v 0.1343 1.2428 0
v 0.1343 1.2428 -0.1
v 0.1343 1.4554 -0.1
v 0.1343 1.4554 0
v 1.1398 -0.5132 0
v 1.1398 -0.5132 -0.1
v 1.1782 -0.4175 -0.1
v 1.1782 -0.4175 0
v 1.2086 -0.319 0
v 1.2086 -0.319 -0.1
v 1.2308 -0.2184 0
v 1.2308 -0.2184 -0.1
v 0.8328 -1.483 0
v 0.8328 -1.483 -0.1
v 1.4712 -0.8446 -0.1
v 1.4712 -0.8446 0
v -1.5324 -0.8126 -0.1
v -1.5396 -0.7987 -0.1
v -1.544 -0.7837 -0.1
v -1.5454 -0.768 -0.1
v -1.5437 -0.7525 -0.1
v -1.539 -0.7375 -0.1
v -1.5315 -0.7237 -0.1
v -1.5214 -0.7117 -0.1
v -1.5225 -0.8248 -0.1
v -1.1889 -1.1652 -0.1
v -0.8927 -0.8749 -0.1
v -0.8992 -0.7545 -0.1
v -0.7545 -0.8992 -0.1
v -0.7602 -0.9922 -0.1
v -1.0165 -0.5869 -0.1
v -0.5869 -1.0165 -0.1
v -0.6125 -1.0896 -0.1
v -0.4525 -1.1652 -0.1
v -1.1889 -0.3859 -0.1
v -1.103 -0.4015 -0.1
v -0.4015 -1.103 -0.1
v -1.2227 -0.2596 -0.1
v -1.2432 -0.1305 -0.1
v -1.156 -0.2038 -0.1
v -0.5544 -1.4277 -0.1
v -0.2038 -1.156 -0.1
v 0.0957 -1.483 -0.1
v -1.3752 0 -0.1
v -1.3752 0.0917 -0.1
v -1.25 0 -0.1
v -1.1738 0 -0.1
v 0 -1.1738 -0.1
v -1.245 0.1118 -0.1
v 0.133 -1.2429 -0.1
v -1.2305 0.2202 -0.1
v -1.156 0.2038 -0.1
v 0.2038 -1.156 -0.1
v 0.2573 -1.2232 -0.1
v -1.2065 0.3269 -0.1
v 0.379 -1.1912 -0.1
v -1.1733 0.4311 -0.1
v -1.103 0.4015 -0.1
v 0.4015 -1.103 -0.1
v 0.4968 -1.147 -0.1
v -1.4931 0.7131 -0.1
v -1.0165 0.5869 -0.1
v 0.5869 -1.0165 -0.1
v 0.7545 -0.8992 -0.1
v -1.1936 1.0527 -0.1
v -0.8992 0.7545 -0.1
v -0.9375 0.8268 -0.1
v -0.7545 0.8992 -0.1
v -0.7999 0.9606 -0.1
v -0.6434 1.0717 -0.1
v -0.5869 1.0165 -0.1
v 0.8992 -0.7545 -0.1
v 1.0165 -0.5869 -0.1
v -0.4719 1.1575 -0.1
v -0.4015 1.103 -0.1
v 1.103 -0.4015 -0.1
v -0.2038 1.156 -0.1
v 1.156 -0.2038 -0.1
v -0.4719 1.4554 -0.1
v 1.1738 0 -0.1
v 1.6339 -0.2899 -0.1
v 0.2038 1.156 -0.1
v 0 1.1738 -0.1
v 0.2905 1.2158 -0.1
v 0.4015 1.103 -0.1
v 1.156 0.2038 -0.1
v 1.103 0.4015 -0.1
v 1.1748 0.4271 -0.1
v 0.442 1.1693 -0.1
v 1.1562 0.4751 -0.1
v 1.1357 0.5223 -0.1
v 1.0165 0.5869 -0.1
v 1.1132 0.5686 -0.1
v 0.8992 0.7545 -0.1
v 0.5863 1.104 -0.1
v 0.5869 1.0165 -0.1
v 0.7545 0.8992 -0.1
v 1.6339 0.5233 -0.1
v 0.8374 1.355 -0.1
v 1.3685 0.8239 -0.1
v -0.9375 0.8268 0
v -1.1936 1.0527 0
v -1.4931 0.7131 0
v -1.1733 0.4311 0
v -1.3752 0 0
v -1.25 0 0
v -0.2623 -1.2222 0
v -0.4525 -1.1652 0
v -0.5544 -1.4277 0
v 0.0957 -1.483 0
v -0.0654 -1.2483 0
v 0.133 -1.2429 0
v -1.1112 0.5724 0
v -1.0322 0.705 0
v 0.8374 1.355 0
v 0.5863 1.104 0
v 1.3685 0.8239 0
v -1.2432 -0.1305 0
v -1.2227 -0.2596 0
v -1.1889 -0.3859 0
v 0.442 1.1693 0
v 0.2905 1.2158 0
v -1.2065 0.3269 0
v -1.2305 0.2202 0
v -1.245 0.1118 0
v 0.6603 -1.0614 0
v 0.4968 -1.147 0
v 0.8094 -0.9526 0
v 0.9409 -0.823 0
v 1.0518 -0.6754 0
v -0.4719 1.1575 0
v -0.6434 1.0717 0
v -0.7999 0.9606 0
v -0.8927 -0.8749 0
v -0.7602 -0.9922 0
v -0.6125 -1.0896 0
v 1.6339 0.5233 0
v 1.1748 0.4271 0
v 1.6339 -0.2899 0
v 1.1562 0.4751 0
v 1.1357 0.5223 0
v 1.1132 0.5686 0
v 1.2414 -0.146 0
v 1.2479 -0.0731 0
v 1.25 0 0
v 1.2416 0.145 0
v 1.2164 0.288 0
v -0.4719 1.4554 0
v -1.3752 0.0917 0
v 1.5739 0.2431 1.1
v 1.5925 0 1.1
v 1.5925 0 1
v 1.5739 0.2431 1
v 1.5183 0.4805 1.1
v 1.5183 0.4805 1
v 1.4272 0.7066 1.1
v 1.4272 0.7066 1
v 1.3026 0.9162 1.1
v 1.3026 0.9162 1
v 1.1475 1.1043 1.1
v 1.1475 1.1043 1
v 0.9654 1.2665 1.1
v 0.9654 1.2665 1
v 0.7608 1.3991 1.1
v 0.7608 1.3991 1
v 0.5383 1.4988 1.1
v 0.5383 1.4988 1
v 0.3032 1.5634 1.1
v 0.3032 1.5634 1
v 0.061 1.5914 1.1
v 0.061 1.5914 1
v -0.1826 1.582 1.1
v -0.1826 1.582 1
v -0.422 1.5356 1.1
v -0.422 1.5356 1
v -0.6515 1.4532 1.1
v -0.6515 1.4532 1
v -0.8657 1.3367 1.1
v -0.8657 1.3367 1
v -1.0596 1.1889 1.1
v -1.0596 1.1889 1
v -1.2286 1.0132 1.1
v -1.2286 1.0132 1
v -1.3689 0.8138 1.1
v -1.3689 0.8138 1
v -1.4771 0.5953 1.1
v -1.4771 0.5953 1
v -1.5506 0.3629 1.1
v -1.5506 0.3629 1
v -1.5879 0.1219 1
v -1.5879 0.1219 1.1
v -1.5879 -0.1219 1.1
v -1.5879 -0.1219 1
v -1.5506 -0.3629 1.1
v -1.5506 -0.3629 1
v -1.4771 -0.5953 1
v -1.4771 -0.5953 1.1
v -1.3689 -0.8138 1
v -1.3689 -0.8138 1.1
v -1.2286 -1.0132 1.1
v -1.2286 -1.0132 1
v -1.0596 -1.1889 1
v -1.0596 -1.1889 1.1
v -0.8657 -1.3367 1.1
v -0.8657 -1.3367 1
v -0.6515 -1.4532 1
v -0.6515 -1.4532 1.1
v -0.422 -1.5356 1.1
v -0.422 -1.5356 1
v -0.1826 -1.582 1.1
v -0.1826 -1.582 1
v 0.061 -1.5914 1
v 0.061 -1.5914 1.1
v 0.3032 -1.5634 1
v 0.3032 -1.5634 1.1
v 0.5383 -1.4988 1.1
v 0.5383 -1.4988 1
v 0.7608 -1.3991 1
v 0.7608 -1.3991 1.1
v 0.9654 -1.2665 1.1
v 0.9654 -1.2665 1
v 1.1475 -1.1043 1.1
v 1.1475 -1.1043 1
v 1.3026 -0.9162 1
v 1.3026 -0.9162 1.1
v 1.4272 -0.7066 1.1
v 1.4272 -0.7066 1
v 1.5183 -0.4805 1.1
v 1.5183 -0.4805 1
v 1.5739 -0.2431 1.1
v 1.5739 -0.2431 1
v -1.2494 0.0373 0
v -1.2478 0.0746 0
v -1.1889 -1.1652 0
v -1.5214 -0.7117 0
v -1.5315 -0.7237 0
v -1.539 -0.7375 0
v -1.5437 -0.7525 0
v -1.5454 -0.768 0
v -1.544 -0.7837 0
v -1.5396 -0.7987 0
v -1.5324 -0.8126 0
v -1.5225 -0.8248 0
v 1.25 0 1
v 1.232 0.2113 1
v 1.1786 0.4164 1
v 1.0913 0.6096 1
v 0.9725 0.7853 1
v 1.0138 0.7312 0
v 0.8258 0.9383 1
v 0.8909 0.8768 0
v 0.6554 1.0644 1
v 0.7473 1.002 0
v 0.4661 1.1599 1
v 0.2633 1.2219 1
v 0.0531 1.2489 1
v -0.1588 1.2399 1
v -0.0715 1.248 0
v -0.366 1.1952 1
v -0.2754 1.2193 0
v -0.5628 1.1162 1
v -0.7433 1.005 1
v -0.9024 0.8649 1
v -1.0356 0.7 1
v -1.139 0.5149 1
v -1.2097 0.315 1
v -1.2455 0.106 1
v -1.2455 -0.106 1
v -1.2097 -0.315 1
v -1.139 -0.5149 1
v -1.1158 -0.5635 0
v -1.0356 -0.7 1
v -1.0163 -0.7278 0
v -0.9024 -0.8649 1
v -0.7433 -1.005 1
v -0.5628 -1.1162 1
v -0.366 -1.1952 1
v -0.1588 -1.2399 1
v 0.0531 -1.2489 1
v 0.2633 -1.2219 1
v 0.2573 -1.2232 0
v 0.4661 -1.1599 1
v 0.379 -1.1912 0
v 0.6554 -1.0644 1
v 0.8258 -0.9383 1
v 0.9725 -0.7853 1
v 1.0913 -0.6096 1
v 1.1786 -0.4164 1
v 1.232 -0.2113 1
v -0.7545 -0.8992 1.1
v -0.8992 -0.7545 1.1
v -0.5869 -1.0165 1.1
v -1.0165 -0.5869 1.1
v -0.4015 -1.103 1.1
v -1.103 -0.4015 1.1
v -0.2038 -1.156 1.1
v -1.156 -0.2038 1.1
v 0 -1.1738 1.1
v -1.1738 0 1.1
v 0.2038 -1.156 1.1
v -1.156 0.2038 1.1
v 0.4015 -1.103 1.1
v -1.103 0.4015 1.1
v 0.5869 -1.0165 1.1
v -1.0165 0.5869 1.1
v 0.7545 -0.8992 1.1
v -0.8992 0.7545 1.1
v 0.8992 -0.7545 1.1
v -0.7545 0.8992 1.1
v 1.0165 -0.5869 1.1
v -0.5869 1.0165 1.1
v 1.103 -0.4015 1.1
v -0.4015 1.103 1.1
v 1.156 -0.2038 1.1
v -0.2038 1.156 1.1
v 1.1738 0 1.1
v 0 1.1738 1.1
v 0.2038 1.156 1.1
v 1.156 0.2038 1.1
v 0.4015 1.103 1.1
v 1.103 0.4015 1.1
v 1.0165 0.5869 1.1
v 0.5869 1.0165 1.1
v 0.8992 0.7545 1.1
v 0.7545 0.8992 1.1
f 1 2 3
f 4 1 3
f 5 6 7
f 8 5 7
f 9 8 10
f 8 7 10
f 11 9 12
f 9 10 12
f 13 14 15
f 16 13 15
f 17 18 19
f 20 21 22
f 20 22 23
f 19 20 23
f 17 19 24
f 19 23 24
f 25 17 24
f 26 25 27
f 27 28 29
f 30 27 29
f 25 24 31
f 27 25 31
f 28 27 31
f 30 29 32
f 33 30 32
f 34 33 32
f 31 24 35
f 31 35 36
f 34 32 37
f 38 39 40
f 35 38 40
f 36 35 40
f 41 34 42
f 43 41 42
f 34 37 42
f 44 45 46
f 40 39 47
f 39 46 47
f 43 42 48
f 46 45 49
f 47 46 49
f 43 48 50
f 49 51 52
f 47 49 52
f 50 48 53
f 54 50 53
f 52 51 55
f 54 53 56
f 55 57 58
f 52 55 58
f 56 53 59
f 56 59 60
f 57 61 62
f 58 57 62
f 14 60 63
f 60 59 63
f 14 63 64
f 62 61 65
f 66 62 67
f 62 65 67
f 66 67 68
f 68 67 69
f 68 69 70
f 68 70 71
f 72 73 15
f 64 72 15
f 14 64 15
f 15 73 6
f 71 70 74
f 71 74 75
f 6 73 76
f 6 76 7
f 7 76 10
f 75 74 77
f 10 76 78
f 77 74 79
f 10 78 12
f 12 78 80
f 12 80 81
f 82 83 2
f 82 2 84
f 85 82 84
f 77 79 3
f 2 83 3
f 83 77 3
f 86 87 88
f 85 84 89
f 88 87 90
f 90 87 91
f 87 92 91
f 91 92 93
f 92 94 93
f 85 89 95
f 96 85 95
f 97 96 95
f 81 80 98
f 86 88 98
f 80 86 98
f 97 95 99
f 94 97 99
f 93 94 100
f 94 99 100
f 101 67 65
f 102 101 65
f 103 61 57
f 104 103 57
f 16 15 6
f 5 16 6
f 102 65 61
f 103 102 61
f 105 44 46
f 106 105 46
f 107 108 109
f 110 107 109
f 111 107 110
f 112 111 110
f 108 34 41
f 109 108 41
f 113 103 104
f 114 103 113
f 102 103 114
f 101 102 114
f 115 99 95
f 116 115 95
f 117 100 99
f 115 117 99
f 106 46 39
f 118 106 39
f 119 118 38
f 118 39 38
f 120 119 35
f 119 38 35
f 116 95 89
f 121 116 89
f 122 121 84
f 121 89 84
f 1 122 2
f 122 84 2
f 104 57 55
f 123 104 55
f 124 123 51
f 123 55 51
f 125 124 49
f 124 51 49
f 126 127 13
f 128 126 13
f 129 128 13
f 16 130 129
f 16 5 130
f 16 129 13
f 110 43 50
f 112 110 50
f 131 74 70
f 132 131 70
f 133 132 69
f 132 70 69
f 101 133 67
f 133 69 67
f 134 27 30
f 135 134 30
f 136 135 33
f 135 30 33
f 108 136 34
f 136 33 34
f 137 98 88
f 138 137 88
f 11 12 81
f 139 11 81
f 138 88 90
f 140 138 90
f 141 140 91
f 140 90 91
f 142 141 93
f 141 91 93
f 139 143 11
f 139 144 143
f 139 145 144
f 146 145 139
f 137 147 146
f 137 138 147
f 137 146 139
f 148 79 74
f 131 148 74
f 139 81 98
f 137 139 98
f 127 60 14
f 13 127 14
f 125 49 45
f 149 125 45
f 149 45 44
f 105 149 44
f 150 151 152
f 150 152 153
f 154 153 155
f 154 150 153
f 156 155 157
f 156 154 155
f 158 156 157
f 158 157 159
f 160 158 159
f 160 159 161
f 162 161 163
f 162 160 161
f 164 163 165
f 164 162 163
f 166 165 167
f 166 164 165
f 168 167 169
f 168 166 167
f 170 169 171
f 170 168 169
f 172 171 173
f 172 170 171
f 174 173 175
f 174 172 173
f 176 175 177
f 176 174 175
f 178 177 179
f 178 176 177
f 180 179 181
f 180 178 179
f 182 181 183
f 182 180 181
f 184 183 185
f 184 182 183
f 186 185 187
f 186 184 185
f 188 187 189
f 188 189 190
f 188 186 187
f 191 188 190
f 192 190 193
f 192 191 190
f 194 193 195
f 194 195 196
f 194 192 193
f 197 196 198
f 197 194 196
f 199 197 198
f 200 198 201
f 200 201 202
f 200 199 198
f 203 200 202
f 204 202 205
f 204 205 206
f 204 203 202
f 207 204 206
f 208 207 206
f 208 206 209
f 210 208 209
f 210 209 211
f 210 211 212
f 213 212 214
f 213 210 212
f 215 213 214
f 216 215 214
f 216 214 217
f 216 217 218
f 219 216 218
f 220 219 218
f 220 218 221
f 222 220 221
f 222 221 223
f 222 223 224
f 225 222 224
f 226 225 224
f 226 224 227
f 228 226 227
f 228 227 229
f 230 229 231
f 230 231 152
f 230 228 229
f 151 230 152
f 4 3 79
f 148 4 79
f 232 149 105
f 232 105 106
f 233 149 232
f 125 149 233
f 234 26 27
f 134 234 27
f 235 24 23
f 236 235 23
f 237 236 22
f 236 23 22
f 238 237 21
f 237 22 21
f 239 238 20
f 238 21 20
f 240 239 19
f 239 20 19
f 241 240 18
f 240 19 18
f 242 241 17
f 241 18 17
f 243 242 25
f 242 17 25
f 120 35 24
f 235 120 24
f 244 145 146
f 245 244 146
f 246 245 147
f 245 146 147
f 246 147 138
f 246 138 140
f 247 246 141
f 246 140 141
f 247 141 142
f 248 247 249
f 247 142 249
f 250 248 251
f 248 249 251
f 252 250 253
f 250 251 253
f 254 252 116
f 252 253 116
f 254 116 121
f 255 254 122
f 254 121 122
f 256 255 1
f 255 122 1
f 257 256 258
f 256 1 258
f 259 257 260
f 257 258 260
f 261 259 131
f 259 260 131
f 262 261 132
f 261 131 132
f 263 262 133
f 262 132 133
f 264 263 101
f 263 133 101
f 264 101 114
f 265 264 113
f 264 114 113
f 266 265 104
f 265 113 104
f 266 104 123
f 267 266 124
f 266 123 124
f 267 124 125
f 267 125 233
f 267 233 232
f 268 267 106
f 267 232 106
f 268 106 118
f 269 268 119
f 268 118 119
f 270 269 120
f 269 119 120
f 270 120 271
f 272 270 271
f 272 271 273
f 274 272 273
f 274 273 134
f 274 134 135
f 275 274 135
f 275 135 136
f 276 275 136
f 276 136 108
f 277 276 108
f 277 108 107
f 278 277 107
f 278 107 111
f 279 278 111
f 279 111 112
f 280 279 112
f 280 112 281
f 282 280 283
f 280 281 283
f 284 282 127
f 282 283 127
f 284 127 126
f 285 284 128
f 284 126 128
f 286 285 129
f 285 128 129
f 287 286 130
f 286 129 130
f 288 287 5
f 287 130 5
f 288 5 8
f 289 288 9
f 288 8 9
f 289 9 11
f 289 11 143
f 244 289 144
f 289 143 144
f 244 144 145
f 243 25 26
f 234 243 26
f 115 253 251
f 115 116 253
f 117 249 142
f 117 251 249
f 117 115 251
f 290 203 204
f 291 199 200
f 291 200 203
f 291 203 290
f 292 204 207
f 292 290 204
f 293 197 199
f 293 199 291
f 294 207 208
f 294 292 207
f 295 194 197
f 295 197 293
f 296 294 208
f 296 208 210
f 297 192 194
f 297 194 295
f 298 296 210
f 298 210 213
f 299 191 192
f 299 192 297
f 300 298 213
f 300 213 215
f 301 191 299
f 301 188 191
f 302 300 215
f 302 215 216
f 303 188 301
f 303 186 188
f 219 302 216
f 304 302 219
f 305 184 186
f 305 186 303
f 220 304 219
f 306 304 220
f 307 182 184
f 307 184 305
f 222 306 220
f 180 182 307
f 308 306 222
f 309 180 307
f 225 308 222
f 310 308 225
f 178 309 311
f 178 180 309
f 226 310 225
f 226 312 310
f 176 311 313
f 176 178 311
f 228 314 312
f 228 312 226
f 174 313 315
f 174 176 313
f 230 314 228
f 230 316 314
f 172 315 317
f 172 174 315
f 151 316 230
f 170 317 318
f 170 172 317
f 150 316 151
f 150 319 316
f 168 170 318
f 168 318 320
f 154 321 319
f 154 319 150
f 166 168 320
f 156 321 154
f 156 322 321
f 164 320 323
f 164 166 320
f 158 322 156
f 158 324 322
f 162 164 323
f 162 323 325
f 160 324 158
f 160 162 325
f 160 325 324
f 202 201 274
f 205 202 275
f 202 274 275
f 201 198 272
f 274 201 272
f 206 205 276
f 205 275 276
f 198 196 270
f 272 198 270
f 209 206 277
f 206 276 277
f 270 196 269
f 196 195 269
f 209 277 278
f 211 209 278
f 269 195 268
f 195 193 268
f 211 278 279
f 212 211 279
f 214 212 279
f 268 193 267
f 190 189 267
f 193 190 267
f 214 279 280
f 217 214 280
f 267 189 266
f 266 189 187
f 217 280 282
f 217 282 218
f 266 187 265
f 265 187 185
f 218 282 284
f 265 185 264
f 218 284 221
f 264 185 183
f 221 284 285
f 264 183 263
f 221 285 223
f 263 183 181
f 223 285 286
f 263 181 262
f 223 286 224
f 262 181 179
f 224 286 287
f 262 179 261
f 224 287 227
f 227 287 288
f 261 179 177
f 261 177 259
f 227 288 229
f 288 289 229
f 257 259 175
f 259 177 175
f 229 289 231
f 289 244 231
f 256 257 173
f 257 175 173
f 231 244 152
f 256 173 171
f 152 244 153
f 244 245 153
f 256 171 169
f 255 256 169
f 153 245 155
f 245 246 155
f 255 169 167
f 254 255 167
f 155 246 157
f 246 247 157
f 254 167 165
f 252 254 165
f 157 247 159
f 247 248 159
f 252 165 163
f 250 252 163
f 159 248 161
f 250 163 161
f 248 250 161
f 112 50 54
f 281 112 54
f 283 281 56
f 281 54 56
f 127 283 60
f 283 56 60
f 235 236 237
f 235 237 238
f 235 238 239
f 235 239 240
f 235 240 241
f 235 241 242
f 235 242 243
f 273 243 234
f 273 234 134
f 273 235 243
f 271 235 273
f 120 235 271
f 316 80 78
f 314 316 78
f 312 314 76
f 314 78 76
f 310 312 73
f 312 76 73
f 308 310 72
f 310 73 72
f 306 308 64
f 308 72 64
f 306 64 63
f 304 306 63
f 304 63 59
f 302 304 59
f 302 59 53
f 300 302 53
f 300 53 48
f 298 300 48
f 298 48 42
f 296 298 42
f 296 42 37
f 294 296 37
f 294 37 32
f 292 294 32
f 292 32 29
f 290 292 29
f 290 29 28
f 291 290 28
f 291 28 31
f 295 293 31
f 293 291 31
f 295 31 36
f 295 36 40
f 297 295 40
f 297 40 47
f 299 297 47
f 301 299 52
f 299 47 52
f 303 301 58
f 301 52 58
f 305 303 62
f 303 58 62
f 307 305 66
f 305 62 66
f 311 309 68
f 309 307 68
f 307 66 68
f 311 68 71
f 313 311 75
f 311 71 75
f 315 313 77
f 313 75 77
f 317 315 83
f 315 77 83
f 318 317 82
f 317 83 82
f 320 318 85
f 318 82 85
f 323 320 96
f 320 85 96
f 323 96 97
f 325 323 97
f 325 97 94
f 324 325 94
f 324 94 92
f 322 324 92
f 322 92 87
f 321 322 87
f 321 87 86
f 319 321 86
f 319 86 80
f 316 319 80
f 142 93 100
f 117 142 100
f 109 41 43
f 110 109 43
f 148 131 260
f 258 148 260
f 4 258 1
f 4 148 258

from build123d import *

# Parameters (mm, degrees)
SKICA1_R                 = 1.25
P_IDAT_VYSUNUT_M1_DEPTH  = 1
SKICA2_R                 = 1.173786911
ODEBRAT_VYSUNUT_M1_DEPTH = 10
P_IDAT_START             = 0.1
SKICA3_R                 = 1.592540519
SKICA3_R_2               = 1.173786911
P_IDAT_VYSUNUT_M2_DEPTH  = 0.1
SKICA4_R                 = 1.173786911
P_IDAT_VYSUNUT_M3_DEPTH  = 0.1


with BuildPart() as part:
    # Skica1 → Přidat vysunutím1 (new body)
    with BuildSketch(Plane.XY):
        Circle(SKICA1_R)
    extrude(amount=P_IDAT_VYSUNUT_M1_DEPTH)

    # Skica2 → Odebrat vysunutím1 (cut)
    with BuildSketch(Plane.XY.offset(1)):
        Circle(SKICA2_R)
    extrude(amount=-ODEBRAT_VYSUNUT_M1_DEPTH, mode=Mode.SUBTRACT)

    # Skica3 → Přidat vysunutím2 (add)
    with BuildSketch(Plane.XY.offset(1).offset(P_IDAT_START)):
        Circle(SKICA3_R)
        Circle(SKICA3_R_2, mode=Mode.SUBTRACT)
    extrude(amount=-P_IDAT_VYSUNUT_M2_DEPTH)

    # Skica4 → Přidat vysunutím3 (add)
    with BuildSketch(Plane(origin=(0, 0, 0), x_dir=(-1, 0, 0), z_dir=(0, 0, -1)).offset(P_IDAT_START)):
        with BuildLine():
            Line((-0.134315846, 1.24276275), (-0.134315846, 1.455404156))
            Line((-0.134315846, 1.455404156), (0.471854701, 1.455404156))
            Line((0.471854701, 1.455404156), (0.471854701, 1.157520255))
            ThreePointArc((0.471854701, 1.157520255), (0.723799345, 1.019124383), (0.937467385, 0.826834266))
            Line((0.937467385, 0.826834266), (1.193570715, 1.052714134))
            Line((1.193570715, 1.052714134), (1.493085883, 0.71312286))
            Line((1.493085883, 0.71312286), (1.173313122, 0.431087367))
            ThreePointArc((1.173313122, 0.431087367), (1.219641203, 0.273816243), (1.244987165, 0.111834515))
            Line((1.244987165, 0.111834515), (1.375237606, 0.091671596))
            Line((1.375237606, 0.091671596), (1.375237606, 0))
            Line((1.375237606, 0), (1.25, 0))
            ThreePointArc((1.25, 0), (1.234641469, -0.19534698), (1.188943292, -0.385893572))
            Line((1.188943292, -0.385893572), (1.521394679, -0.71171305))
            ThreePointArc((1.521394679, -0.71171305), (1.545394832, -0.768042668), (1.522534448, -0.824844394))
            Line((1.522534448, -0.824844394), (1.188943292, -1.165225648))
            Line((1.188943292, -1.165225648), (0.892743068, -0.874934177))
            ThreePointArc((0.892743068, -0.874934177), (0.688100113, -1.043560365), (0.452492198, -1.165225648))
            Line((0.452492198, -1.165225648), (0.554420085, -1.427703077))
            Line((0.554420085, -1.427703077), (-0.095705572, -1.483046114))
            Line((-0.095705572, -1.483046114), (-0.13304786, -1.242899138))
            ThreePointArc((-0.13304786, -1.242899138), (-0.31854859, -1.208729414), (-0.496795977, -1.147036947))
            Line((-0.496795977, -1.147036947), (-0.832805143, -1.483046114))
            Line((-0.832805143, -1.483046114), (-1.471238112, -0.844613145))
            Line((-1.471238112, -0.844613145), (-1.139802222, -0.513177255))
            ThreePointArc((-1.139802222, -0.513177255), (-1.194422371, -0.368585403), (-1.230780155, -0.218357988))
            Line((-1.230780155, -0.218357988), (-1.633865576, -0.289871103))
            Line((-1.633865576, -0.289871103), (-1.633865576, 0.523252679))
            Line((-1.633865576, 0.523252679), (-1.174778121, 0.427078876))
            ThreePointArc((-1.174778121, 0.427078876), (-1.14617393, 0.498783843), (-1.113197918, 0.568586312))
            Line((-1.113197918, 0.568586312), (-1.368475858, 0.823864252))
            Line((-1.368475858, 0.823864252), (-0.837363868, 1.354976242))
            Line((-0.837363868, 1.354976242), (-0.586338391, 1.103950765))
            ThreePointArc((-0.586338391, 1.103950765), (-0.36695071, 1.194925594), (-0.134315846, 1.24276275))
        make_face()
        with Locations(Location((0, 0, 0), (0, 0, 180))):
            Circle(SKICA4_R, mode=Mode.SUBTRACT)
    extrude(amount=-P_IDAT_VYSUNUT_M3_DEPTH)


solid = part.part
